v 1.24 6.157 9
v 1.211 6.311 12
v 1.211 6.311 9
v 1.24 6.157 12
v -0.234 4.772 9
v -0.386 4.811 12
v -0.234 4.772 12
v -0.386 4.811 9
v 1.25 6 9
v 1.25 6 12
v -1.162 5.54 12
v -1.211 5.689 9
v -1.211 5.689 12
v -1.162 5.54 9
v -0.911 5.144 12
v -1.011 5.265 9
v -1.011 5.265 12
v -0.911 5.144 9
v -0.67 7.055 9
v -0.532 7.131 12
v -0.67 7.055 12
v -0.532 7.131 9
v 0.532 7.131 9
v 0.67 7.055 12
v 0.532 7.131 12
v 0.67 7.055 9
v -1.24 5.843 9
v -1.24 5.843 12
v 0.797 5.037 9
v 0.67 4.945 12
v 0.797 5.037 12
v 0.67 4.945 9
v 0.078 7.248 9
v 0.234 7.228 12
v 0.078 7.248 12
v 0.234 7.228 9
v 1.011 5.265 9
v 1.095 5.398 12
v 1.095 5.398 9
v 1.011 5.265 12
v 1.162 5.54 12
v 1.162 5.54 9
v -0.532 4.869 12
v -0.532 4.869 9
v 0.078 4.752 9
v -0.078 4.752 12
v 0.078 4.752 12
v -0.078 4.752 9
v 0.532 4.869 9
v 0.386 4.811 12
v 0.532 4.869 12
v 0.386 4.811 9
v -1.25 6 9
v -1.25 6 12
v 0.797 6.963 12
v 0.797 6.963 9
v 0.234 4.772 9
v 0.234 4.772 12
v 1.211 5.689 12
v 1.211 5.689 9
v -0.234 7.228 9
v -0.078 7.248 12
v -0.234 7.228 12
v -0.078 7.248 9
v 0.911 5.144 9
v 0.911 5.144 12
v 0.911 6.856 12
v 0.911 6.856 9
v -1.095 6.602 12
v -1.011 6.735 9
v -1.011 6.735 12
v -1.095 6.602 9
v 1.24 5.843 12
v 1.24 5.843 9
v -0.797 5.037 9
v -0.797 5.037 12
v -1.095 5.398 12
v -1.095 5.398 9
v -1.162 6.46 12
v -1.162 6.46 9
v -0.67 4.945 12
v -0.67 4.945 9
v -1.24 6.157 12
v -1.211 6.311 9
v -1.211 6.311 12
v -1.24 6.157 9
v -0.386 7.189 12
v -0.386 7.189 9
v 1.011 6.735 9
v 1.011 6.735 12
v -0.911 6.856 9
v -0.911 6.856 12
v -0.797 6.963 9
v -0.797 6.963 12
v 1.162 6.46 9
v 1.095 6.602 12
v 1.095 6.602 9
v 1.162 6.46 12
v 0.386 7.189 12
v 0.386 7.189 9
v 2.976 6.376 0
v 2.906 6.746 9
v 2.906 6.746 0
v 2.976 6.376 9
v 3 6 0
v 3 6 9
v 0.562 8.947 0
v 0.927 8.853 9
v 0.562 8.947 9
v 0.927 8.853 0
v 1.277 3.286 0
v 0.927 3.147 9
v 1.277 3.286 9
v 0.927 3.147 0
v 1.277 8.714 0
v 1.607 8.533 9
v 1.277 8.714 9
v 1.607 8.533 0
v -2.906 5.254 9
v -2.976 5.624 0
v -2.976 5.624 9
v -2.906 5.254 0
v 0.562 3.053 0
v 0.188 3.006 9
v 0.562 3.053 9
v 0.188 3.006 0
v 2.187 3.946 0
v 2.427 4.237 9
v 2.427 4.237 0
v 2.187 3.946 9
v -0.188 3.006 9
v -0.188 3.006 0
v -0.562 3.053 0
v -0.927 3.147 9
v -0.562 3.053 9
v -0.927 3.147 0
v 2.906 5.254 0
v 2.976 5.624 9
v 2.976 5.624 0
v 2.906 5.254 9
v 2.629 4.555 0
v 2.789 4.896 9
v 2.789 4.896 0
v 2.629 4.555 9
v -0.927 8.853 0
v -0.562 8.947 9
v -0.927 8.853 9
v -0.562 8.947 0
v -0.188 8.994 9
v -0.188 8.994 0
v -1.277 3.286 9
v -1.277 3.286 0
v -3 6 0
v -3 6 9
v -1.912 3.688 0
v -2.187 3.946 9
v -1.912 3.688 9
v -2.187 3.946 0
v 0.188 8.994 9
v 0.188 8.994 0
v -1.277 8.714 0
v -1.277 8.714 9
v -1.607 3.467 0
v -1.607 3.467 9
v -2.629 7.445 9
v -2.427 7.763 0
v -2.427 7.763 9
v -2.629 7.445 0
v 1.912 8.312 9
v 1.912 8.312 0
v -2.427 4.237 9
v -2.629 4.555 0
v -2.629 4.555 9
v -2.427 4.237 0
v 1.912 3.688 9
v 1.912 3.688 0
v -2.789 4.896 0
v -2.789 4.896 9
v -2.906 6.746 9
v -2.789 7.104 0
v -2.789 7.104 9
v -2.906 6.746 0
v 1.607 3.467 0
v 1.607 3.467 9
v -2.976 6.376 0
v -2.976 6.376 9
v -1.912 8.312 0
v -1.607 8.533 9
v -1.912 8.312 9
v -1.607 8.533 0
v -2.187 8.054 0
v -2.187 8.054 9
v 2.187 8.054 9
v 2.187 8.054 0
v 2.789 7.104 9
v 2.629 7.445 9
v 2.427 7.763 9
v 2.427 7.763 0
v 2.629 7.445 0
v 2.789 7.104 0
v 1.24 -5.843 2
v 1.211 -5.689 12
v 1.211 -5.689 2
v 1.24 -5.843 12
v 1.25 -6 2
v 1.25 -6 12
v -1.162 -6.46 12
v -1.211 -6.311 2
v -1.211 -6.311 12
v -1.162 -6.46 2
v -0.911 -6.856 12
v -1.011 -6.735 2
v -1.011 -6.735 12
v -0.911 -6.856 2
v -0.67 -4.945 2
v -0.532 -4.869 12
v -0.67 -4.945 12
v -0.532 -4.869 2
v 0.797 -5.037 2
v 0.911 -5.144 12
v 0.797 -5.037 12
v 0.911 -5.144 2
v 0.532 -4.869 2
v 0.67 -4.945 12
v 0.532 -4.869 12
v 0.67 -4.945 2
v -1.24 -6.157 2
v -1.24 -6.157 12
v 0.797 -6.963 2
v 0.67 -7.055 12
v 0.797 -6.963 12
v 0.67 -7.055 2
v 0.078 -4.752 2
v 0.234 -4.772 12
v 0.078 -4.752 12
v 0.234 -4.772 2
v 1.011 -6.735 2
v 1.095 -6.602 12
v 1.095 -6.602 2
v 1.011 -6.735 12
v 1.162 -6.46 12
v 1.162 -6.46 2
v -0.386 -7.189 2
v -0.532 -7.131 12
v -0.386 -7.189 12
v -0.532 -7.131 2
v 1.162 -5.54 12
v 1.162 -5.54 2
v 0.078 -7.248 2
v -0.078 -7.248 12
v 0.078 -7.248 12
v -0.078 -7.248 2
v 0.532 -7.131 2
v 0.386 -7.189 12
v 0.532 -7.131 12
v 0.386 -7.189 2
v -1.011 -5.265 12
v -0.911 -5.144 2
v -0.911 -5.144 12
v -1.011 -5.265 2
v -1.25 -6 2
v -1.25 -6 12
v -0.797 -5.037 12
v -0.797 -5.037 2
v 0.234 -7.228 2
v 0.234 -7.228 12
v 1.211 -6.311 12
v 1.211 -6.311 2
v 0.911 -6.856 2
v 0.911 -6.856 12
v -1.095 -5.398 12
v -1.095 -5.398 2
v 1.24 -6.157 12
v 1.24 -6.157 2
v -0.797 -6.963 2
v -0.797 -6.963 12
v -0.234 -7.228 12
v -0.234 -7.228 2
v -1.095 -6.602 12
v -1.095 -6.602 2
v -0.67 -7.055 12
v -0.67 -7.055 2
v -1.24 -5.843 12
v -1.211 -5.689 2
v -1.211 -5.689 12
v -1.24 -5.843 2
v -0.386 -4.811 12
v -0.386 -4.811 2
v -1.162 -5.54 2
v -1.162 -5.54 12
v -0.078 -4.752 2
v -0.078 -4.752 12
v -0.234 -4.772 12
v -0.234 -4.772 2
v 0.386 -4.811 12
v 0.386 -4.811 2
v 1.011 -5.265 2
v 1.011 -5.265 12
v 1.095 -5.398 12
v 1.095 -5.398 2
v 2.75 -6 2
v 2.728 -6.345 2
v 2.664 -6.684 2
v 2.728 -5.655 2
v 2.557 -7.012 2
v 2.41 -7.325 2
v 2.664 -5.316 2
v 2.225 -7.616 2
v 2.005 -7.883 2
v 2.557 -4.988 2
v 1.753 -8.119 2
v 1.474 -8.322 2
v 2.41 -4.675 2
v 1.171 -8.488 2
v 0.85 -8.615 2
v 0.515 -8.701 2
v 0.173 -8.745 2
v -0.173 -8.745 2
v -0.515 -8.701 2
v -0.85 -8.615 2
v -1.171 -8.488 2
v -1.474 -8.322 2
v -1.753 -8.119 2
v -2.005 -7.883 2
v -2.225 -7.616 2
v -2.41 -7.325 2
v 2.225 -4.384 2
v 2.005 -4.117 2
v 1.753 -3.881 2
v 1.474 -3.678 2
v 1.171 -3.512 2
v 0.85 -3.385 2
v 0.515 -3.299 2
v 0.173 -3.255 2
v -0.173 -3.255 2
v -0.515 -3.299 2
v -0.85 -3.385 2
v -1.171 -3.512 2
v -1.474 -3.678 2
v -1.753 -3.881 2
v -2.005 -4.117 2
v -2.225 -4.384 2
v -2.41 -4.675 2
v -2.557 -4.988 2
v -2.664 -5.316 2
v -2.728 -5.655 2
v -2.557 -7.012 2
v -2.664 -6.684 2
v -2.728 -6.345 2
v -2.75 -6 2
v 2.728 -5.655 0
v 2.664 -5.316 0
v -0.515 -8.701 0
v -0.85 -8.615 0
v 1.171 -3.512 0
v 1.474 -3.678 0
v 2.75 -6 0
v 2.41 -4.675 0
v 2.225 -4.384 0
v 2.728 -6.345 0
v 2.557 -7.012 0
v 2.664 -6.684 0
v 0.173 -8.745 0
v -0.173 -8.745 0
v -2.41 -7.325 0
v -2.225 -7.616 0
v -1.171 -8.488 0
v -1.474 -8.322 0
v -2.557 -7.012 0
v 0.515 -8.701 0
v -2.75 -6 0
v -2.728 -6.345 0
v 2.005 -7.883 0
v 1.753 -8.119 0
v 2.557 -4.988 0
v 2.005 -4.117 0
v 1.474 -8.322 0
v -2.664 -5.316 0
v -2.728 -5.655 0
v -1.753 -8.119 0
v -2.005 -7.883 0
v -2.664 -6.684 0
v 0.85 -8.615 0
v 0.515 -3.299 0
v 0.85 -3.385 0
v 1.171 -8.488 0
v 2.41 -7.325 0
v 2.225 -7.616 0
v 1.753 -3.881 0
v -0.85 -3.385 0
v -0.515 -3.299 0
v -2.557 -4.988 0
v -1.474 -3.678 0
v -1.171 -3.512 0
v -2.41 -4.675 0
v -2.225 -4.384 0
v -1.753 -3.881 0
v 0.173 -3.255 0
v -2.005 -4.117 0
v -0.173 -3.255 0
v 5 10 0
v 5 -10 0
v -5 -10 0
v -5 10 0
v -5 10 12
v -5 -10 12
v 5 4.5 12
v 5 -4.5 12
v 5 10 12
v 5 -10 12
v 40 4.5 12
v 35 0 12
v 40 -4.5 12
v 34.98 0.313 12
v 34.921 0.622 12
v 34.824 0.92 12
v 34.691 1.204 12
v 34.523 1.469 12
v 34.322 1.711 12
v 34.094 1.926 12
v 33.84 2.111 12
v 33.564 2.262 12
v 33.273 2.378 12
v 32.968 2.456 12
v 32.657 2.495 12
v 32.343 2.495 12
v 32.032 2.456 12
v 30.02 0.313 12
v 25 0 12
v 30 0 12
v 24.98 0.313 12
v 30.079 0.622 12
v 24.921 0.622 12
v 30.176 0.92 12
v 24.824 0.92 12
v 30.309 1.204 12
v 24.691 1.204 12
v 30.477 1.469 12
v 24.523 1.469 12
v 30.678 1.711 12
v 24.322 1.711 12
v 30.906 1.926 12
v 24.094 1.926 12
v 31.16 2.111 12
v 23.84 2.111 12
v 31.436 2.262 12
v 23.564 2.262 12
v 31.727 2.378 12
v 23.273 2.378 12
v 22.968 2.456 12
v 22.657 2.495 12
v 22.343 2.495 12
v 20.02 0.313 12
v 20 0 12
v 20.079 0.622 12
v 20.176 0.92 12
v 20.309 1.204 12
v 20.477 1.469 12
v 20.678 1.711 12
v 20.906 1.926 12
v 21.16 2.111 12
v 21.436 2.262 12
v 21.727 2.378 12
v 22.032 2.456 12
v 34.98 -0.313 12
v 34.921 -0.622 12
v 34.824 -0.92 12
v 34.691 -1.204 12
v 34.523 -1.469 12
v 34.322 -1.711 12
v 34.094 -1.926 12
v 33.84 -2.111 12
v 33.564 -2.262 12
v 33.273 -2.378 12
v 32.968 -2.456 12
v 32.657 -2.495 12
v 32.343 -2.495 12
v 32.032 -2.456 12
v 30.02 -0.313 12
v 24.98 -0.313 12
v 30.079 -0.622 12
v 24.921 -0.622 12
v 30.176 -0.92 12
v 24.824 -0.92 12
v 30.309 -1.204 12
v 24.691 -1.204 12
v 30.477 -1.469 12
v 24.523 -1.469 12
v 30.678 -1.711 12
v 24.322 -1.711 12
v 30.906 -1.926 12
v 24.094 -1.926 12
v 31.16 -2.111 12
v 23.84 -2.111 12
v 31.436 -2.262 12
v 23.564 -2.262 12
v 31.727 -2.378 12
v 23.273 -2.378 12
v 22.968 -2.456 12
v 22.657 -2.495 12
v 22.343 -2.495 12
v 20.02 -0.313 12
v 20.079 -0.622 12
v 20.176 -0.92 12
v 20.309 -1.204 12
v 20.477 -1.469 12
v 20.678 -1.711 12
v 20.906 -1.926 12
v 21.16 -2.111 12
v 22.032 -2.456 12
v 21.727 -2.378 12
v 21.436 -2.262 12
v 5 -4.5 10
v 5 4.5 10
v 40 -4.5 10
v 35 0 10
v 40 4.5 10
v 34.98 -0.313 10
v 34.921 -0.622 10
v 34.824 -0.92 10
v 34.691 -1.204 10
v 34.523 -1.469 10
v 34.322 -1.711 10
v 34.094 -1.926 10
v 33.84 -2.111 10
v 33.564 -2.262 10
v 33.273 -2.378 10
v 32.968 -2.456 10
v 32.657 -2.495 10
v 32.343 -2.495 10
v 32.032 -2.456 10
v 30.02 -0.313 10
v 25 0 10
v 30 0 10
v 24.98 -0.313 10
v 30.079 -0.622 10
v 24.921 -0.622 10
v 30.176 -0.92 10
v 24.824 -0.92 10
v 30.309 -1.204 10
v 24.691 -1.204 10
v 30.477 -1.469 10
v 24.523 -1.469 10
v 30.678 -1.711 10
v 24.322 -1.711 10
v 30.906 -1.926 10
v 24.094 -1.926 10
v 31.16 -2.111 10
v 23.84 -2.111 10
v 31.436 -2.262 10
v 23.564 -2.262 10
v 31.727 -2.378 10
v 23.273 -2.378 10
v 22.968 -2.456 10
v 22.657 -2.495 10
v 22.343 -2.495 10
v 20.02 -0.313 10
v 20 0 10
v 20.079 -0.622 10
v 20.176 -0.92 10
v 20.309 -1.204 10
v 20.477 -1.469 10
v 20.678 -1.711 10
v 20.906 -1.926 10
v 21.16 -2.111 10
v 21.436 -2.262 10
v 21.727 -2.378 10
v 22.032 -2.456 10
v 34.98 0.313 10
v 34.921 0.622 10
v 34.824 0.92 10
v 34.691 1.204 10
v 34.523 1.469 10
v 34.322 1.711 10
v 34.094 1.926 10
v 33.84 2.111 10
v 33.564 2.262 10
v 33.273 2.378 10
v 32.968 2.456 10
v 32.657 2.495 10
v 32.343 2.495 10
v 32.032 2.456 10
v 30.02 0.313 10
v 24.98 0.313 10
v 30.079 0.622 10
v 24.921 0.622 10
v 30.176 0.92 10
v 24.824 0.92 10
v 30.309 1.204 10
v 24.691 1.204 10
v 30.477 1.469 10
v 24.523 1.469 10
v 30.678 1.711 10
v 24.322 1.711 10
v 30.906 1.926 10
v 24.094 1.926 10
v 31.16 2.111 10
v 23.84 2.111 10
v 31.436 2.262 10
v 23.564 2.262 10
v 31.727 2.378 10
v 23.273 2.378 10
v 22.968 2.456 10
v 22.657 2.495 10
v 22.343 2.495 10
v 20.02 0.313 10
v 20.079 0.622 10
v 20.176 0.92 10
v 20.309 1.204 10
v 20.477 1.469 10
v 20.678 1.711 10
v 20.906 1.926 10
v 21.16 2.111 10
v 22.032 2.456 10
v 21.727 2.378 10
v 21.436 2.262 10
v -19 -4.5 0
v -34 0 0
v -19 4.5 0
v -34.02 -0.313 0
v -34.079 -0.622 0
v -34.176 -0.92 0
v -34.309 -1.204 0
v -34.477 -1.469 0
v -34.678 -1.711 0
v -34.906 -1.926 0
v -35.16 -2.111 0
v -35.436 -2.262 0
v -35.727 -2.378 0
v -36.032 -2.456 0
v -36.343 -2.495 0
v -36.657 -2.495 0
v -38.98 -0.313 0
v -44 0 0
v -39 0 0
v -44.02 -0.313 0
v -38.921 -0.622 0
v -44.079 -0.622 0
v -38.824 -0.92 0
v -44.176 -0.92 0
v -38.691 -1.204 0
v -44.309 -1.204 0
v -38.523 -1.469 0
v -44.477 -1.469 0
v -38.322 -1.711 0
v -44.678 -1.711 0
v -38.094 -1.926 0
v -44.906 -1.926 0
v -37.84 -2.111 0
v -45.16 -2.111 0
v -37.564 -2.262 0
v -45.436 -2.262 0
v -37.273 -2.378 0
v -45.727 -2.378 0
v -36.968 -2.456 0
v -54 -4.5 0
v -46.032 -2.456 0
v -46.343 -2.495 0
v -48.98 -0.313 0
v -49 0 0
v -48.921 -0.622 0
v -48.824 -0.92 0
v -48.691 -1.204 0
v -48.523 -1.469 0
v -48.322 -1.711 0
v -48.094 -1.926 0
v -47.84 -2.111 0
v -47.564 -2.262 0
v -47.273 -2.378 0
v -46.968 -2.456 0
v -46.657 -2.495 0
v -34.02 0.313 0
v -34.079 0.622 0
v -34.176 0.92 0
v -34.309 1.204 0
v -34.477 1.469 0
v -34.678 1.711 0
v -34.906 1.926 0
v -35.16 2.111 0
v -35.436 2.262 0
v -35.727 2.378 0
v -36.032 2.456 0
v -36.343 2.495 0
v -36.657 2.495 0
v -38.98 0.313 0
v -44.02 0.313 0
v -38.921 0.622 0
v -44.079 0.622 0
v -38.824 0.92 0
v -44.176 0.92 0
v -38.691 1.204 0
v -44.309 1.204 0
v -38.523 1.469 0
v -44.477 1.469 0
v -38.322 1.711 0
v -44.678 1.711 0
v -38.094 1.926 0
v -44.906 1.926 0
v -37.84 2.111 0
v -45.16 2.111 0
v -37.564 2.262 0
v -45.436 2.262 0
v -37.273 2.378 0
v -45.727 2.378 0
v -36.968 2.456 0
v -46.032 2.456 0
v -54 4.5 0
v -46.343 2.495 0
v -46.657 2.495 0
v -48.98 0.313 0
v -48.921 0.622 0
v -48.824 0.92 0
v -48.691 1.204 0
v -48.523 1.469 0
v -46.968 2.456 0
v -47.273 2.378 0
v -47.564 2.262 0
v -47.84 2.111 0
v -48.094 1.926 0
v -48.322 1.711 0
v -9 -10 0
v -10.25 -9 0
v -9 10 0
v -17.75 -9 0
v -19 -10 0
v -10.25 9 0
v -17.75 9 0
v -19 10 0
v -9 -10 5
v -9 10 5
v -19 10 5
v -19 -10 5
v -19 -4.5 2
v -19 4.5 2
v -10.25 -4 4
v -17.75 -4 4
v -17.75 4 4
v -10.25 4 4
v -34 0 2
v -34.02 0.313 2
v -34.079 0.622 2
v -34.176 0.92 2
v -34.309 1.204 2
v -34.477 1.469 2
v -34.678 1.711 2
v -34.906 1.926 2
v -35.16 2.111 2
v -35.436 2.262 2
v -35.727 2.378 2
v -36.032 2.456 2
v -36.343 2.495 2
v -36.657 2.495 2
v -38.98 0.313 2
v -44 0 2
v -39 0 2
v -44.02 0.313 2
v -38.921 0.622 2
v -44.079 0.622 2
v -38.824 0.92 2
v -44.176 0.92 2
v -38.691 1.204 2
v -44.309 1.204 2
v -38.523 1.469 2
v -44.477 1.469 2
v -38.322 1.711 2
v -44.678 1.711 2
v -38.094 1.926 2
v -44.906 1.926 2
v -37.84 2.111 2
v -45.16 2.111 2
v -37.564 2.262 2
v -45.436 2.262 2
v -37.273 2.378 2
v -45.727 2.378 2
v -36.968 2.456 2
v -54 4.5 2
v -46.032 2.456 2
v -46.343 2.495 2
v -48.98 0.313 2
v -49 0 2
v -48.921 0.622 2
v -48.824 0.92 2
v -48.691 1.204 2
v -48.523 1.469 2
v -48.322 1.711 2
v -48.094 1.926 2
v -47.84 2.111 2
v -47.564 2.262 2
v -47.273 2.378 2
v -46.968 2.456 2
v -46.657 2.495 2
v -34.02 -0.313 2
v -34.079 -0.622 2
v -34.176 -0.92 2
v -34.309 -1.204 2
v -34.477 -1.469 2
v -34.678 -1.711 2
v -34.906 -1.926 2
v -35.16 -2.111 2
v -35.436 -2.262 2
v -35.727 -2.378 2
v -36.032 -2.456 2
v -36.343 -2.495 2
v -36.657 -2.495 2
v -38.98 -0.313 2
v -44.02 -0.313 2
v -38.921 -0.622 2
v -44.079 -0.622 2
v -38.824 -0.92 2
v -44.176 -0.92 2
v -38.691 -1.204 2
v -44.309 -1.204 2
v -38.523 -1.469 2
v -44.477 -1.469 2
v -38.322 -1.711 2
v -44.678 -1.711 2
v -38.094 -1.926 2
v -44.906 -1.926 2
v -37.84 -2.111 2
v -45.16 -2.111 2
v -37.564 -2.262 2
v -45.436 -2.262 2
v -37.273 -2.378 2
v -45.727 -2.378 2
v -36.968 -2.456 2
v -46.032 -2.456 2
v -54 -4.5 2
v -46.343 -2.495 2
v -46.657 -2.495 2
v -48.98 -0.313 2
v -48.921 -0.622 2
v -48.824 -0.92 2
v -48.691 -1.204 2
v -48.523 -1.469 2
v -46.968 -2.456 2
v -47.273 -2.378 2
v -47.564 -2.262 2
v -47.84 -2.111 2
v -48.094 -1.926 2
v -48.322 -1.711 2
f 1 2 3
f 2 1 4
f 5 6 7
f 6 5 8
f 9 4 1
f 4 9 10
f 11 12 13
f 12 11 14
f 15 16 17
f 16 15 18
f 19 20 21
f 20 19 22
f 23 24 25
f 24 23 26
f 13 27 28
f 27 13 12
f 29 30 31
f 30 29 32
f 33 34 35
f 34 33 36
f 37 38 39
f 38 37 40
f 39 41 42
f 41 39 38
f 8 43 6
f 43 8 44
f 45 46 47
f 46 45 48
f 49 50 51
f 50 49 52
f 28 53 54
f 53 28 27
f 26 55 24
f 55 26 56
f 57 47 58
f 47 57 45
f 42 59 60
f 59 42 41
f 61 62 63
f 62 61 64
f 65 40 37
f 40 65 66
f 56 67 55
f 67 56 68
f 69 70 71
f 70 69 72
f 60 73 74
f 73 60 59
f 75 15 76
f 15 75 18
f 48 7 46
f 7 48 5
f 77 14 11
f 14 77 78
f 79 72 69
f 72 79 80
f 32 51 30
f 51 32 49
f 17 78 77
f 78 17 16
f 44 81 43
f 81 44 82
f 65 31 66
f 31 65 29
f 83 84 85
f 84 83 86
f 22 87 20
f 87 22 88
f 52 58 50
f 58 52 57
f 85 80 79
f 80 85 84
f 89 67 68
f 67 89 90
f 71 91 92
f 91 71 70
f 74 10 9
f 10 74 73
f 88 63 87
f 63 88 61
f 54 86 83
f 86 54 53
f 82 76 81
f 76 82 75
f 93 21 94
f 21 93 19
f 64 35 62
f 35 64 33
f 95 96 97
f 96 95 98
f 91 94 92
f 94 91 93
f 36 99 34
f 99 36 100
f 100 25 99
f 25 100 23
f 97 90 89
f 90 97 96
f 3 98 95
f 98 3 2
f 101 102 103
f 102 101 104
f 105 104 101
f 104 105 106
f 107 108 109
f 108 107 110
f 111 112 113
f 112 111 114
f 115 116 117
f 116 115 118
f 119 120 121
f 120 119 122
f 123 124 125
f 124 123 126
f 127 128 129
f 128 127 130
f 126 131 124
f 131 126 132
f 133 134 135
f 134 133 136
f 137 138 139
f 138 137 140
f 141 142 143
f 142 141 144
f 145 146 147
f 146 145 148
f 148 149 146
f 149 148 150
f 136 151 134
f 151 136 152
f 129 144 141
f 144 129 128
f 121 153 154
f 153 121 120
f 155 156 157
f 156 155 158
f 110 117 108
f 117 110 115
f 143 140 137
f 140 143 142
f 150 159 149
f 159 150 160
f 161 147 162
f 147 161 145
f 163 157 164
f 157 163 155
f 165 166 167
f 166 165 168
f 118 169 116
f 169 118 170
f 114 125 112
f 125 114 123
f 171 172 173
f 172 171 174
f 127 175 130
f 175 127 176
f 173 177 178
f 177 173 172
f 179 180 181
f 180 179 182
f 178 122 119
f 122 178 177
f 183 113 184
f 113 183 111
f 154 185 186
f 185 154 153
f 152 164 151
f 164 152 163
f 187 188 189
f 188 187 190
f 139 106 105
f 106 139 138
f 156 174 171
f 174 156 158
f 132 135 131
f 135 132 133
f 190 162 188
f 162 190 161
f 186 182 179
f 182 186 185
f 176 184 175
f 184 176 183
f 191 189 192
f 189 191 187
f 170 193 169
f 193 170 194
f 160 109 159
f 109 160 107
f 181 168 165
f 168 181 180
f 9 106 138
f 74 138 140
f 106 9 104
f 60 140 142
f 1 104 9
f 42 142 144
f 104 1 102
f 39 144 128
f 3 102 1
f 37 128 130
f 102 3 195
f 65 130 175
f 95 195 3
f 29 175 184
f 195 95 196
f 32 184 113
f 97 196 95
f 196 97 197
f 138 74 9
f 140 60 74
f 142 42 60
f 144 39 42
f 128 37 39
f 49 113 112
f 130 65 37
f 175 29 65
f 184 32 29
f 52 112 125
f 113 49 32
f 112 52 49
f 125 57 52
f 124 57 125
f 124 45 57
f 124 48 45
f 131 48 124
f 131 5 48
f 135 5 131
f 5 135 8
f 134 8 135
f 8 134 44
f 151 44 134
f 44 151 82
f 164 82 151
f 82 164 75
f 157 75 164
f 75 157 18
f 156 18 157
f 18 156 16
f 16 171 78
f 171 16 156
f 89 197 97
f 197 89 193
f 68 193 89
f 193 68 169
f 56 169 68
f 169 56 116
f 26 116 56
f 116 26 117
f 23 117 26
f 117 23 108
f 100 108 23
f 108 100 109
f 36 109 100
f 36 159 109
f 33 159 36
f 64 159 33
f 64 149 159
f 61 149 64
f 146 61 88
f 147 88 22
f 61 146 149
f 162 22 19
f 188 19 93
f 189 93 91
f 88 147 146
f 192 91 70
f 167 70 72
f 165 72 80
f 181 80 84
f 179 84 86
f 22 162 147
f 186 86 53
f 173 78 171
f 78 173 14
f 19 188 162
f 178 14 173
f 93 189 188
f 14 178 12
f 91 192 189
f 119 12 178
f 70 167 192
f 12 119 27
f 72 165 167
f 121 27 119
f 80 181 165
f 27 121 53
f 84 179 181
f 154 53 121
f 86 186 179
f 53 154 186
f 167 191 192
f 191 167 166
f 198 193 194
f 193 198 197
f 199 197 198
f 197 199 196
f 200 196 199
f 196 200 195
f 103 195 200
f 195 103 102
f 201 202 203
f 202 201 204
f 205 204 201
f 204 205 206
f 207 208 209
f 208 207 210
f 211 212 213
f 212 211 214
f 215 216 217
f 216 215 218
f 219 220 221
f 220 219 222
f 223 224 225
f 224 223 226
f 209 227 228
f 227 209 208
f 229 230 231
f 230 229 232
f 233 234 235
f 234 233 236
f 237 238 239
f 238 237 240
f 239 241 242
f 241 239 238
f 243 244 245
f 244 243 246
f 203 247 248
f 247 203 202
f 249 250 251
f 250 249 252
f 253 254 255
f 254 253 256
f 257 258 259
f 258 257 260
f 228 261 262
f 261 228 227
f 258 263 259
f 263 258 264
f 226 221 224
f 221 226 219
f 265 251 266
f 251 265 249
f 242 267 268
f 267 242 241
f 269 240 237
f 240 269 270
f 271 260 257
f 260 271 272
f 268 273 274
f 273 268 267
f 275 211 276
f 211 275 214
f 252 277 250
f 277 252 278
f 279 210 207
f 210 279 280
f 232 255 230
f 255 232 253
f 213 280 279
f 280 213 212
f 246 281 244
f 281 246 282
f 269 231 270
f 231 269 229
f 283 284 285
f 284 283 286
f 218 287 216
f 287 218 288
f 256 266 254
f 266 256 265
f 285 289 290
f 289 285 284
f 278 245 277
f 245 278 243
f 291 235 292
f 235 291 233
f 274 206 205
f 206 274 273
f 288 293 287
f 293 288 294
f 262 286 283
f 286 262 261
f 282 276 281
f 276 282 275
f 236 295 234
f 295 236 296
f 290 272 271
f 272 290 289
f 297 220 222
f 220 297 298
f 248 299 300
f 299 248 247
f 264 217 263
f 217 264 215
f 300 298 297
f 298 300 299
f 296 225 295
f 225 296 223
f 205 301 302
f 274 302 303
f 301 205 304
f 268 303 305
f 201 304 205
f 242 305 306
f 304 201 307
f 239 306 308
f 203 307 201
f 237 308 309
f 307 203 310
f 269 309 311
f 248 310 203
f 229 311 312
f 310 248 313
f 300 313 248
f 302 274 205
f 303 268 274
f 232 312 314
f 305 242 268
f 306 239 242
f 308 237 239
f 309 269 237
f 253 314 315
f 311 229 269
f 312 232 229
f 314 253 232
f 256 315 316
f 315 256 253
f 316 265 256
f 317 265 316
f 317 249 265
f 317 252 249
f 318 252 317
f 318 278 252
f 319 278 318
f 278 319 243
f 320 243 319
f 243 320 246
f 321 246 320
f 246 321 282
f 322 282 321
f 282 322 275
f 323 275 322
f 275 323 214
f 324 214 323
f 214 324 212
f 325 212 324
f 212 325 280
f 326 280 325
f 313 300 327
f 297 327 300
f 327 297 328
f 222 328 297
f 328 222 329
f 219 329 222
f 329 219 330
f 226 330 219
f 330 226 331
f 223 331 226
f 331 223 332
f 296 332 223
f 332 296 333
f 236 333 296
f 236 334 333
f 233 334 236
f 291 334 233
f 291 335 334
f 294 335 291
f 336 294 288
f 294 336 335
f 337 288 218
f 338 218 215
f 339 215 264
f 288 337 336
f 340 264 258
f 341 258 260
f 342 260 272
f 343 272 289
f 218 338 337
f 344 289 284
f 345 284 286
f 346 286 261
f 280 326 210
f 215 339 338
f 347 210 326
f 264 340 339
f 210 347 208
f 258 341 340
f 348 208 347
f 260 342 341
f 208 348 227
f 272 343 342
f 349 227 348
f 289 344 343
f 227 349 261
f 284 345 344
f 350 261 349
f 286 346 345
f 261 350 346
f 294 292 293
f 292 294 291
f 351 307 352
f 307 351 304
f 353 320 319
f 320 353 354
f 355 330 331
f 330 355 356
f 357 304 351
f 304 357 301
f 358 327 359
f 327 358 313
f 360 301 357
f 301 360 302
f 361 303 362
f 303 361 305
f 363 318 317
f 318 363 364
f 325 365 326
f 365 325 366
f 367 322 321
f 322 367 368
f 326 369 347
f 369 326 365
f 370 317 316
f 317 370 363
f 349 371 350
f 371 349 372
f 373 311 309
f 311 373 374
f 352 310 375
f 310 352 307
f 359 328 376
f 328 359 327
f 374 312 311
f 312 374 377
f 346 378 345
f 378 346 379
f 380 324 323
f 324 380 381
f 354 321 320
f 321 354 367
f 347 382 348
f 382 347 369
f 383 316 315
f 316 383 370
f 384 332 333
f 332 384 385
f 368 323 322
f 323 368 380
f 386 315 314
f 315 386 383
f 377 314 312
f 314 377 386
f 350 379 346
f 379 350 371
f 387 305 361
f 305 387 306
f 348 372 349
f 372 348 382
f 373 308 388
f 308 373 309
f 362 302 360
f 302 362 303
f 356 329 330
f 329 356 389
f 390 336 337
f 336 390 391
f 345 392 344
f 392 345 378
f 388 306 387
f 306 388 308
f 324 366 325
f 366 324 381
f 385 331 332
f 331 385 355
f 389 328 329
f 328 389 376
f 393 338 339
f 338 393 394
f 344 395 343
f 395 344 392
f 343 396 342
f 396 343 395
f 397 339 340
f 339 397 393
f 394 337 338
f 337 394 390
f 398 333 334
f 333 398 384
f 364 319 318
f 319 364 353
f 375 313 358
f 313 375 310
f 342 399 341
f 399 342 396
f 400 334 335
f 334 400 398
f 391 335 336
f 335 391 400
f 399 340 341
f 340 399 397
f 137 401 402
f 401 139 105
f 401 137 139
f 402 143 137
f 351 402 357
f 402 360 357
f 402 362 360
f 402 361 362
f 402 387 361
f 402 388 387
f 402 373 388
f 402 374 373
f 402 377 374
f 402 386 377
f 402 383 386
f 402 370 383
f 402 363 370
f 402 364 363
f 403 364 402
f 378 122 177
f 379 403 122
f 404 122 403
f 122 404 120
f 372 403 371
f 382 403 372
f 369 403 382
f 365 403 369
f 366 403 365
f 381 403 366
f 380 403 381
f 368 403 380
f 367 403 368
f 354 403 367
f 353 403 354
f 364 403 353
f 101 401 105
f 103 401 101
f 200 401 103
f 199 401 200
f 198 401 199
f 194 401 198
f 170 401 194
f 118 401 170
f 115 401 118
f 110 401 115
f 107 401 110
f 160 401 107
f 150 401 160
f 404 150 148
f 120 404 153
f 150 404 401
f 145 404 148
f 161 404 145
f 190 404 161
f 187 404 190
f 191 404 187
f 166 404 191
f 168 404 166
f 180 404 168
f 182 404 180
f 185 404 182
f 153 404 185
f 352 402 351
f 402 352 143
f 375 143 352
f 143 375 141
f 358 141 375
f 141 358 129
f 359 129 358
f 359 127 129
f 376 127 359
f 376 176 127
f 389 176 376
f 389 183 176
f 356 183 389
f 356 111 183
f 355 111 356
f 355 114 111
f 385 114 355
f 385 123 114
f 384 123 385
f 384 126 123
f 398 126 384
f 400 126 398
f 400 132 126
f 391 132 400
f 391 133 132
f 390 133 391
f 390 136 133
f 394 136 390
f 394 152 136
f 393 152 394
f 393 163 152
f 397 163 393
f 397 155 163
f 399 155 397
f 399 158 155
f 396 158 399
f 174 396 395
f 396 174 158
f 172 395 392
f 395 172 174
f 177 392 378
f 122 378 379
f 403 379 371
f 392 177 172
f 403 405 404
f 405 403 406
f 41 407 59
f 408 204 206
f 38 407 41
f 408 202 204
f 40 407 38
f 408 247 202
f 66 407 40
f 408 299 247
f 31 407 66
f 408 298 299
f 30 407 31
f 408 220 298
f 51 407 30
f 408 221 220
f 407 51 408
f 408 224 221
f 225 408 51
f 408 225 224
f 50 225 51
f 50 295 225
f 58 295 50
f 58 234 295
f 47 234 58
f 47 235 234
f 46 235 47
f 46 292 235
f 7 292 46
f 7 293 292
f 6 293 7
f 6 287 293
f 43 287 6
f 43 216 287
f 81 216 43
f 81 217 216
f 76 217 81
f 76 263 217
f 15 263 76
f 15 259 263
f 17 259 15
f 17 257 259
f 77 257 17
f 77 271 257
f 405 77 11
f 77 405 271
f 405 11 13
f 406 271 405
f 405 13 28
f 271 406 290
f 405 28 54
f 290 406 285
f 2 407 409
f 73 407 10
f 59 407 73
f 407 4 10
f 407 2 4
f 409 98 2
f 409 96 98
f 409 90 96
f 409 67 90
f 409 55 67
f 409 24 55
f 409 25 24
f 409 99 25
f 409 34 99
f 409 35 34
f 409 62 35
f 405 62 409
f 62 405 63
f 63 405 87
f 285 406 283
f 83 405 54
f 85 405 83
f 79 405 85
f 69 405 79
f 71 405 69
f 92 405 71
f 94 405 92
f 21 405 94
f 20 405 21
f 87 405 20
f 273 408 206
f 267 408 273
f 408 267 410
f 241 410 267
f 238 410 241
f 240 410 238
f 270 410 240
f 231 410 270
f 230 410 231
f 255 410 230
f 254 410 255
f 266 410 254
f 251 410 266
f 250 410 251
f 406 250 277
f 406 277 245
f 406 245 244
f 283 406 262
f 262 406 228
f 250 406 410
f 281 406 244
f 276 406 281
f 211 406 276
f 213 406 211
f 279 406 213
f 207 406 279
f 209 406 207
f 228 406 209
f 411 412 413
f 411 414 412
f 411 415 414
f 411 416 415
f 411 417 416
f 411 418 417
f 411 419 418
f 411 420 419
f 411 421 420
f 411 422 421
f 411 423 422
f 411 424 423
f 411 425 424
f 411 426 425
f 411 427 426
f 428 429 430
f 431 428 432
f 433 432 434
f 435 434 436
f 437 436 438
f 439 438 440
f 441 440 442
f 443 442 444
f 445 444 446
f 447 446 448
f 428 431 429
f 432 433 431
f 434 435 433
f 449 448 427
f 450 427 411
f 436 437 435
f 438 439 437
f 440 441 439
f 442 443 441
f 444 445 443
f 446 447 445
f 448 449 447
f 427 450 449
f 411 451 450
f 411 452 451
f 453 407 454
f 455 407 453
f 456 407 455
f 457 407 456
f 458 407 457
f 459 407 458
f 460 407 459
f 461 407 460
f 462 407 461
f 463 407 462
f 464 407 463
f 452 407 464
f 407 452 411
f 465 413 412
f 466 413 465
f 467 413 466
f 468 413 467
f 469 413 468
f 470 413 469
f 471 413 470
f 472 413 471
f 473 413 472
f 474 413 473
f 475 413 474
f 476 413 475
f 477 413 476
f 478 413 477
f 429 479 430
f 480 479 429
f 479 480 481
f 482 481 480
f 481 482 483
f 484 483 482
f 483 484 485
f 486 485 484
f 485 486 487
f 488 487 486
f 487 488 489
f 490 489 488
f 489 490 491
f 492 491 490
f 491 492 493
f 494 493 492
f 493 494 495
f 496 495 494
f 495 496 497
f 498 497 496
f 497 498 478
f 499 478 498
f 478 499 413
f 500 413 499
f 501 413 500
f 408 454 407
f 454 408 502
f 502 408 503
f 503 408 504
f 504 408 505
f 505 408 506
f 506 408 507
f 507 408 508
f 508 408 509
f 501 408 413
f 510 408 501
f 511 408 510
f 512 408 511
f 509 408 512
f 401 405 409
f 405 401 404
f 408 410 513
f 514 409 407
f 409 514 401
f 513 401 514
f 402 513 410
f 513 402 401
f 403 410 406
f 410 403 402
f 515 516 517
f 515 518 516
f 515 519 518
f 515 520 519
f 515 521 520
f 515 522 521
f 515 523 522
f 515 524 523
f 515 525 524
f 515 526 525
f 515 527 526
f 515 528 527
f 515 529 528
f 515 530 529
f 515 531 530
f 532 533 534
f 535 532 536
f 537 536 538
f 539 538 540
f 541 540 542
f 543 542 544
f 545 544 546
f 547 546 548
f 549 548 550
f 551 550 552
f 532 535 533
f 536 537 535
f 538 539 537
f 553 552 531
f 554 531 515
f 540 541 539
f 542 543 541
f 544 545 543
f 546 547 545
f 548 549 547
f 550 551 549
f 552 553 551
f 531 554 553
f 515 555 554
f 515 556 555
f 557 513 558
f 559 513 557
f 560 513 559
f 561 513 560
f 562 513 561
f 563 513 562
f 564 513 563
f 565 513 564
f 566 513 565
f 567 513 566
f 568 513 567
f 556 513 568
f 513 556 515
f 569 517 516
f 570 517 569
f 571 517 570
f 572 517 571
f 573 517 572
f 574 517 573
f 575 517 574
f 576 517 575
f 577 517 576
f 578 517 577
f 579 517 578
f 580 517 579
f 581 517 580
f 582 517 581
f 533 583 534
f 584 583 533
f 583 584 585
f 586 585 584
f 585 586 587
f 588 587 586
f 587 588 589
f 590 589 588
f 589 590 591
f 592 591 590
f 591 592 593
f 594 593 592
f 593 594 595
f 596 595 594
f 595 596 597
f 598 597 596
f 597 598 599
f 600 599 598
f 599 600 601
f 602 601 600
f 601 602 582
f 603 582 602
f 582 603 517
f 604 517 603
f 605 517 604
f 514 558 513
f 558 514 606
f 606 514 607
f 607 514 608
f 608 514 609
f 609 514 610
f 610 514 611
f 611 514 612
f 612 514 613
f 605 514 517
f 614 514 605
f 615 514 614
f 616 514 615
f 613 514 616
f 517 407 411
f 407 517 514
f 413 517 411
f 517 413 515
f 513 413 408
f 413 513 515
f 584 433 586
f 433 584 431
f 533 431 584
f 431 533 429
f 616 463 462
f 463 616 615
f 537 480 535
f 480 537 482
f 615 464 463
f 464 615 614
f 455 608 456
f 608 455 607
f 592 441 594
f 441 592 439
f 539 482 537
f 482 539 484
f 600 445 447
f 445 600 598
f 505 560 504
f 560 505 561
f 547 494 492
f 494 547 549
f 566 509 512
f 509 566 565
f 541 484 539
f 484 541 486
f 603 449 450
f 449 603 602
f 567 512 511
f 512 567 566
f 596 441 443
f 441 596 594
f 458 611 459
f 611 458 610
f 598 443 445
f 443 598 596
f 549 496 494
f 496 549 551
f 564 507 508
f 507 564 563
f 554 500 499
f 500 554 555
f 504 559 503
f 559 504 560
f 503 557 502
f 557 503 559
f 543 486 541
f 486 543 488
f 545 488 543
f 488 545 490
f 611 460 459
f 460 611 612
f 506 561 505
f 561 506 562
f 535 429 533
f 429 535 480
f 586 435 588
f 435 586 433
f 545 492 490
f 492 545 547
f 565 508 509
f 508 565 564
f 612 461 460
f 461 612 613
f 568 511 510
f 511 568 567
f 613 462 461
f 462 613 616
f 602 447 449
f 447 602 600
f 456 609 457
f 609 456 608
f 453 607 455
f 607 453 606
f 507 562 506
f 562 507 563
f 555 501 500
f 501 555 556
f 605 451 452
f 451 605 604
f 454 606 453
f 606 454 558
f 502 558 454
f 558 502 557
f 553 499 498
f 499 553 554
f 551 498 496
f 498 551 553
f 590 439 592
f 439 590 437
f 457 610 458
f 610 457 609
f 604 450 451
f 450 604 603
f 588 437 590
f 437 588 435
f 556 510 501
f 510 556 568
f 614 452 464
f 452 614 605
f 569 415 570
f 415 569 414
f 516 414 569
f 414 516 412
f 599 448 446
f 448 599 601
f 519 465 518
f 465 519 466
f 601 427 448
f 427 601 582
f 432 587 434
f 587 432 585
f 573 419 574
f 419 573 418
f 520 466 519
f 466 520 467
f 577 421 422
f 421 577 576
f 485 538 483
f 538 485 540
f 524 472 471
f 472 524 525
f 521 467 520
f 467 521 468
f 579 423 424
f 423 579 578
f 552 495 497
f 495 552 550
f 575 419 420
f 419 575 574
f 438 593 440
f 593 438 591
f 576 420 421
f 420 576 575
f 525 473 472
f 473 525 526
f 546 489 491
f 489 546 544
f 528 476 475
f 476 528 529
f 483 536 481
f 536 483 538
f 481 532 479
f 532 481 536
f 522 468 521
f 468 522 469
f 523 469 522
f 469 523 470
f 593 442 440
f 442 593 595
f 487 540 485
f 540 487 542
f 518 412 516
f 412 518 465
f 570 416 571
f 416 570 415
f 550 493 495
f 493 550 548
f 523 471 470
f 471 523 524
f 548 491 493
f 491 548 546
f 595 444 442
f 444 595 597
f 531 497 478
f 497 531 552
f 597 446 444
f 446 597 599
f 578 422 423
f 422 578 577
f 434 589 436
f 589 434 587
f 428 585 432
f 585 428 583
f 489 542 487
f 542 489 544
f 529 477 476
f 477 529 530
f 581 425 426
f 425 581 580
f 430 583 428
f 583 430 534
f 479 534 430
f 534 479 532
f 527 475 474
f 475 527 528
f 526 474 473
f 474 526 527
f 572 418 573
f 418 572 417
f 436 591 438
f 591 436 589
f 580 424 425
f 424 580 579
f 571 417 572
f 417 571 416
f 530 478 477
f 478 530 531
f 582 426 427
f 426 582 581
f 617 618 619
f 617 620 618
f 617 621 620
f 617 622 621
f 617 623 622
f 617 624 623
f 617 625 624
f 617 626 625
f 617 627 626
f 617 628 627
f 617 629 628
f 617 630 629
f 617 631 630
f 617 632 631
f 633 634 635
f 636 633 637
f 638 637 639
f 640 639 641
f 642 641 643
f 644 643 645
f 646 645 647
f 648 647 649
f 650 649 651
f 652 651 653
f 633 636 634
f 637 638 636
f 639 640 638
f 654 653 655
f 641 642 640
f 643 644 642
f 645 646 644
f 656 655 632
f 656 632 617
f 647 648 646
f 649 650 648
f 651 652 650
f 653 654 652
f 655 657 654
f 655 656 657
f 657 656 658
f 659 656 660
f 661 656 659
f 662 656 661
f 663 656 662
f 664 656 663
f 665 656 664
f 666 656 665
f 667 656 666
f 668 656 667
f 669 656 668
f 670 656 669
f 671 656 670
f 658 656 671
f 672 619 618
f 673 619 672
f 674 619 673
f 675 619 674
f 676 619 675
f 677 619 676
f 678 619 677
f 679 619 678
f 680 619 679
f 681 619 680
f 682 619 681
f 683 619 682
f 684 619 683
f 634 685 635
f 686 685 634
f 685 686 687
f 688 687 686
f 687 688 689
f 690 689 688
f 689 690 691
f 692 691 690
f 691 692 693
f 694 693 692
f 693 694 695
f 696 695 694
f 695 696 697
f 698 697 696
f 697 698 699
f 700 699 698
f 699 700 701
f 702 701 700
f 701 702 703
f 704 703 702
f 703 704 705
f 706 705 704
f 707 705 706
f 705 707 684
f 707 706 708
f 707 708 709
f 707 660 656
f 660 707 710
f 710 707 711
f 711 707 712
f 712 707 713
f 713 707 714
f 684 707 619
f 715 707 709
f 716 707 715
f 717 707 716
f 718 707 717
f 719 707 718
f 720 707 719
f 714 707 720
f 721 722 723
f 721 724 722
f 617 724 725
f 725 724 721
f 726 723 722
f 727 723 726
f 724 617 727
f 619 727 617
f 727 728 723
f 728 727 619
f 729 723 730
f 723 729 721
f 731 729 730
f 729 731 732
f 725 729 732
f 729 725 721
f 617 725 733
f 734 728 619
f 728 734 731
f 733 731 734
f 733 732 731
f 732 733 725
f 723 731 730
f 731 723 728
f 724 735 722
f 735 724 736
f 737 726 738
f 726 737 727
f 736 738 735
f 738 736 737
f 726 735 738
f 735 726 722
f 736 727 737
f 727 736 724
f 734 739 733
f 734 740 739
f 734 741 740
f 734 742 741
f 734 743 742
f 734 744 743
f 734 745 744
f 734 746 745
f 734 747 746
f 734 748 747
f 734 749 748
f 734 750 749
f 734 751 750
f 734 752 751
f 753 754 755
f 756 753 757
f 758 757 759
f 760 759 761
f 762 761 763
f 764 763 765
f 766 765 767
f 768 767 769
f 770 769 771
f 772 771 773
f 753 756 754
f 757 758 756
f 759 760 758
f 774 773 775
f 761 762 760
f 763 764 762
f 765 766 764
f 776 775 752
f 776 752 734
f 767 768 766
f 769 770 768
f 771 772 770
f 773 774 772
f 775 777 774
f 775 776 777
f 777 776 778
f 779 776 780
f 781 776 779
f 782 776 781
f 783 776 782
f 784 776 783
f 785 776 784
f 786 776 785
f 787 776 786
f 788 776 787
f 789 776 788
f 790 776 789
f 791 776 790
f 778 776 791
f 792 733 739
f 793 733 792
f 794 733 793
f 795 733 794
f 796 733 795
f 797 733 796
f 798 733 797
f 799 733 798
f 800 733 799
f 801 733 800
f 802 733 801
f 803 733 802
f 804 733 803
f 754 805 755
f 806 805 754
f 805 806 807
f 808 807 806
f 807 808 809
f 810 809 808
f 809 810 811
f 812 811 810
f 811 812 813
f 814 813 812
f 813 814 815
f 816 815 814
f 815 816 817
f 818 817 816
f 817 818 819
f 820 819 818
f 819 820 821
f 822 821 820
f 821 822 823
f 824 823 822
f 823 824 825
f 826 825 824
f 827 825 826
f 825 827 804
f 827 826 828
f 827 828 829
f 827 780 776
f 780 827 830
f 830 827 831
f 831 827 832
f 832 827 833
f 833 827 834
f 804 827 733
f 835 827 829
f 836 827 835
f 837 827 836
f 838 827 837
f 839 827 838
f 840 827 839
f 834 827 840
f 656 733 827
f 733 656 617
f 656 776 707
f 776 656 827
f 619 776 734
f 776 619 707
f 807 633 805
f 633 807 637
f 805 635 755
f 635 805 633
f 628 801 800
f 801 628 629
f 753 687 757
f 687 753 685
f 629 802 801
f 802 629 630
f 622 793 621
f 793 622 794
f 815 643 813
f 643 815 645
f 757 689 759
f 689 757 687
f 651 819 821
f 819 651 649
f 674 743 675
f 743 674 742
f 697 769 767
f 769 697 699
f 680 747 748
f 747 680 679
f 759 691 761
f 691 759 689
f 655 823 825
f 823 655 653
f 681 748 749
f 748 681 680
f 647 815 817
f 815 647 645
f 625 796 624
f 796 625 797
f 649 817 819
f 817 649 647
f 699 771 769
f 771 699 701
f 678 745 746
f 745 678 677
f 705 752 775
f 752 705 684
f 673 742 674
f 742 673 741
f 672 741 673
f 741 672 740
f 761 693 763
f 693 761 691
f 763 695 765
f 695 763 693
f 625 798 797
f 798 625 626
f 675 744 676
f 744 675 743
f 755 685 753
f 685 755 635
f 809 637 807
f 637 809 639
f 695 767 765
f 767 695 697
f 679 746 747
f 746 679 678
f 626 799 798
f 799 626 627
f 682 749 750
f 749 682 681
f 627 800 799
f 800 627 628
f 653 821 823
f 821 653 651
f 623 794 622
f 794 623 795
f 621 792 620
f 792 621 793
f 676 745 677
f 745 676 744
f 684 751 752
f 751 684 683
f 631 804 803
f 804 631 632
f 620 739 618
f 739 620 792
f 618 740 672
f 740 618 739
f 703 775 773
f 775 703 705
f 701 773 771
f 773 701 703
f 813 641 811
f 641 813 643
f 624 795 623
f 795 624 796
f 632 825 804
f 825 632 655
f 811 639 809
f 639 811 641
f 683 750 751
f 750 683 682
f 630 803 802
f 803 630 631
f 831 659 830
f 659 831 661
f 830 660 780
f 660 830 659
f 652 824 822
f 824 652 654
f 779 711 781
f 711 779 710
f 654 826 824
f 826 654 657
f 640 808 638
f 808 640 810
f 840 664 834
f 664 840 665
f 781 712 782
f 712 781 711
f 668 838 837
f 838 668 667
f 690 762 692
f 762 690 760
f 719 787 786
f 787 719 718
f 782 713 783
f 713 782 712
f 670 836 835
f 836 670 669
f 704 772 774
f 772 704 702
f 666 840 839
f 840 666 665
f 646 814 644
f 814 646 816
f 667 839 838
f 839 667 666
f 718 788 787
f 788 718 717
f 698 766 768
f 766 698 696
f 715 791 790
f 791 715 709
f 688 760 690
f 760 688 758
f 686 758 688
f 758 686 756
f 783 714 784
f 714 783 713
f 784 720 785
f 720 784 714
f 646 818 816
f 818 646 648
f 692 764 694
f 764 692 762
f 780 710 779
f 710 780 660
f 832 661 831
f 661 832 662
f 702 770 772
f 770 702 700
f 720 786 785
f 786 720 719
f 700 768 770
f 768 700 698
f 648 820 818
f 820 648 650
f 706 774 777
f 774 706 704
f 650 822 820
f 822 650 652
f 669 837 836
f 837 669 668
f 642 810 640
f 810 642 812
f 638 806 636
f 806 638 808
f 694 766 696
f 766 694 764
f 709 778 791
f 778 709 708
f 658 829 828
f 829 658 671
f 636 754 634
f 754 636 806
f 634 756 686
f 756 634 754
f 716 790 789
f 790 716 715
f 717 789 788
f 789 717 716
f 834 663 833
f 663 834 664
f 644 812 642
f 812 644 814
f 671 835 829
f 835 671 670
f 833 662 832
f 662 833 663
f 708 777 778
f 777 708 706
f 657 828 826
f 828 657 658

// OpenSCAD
/* [Laser Diode] */
laser_light_hole_diameter = 2.5; //[0:5]

laser_diameter = 6; //[1:20]

laser_length = 9; // [5:25]

/* [General] */
module_height = 20; 

resolution = 50; //[10:100]

/* [Receiver Diode] */
receiver_diameter = 5.5; //[1:20]

reciever_depth_in_module = 3; //[1:10]

/* [Mirrors] */
module_thickness = 5; //[5:20]

/* [Mounting] */
activate_mounting = true; //[true,false]

mounting_distance = 20; //[5:30]

mounting_screw_diameter = 5; //[2:35]

mounting_thickness = 2; //[2:20]

laser_module_on_top = true; //[false,true]

mirror_module_on_top = false; //[false,true]

/*[Creation Selection] */
create = 0; //[0:both, 1:laser, 2:mirror]

/* [Hidden]*/
distance_length = mounting_distance + mounting_screw_diameter * 3;

module mounting(x,y,z) {
translate([x,y,z])
    difference() {
                translate([(distance_length)/2 + (laser_diameter+4)/2,0,0])
                    linear_extrude(mounting_thickness)
                        square([distance_length, mounting_screw_diameter + 4], true);
                translate([mounting_distance + mounting_screw_diameter/2,0,-1])
                    linear_extrude(mounting_thickness*2)
                        circle(d=mounting_screw_diameter, true, $fn=resolution);
                translate([mounting_distance + mounting_screw_diameter*2.5,0,-1])
                    linear_extrude(mounting_thickness*2)
                        circle(d=mounting_screw_diameter, true, $fn=resolution);
            }
}

module laser_module() {
    union(){
        difference() {
            linear_extrude(laser_length + 3)
                square([laser_diameter + 4,module_height,],true);
            
            translate([0,module_height/2 -4,0]) {
                translate([0,0,laser_length - 1])
                    linear_extrude(laser_length)
                        circle(d=laser_light_hole_diameter, $fn=resolution);
                translate([0,0,-1])
                    linear_extrude(laser_length + 1)
                        circle(d=laser_diameter, $fn=resolution);
            }
            
            translate([0,-module_height/2 + 4,0]) {
                translate([0,0,reciever_depth_in_module - 1])
                    linear_extrude(laser_length +4)
                        circle(d=laser_light_hole_diameter, $fn=resolution);
                translate([0,0,-1])
                    linear_extrude(reciever_depth_in_module)
                        circle(d=receiver_diameter, $fn=resolution);
            }
        }
        if(activate_mounting) {
            if(laser_module_on_top) {
                mounting(0,0,laser_length+3-mounting_thickness);
            }else {
                mounting(0,0,0);
            }
                
        }
    }
}
module mirror_module() {
    translate([-laser_diameter -8,0,0])
    rotate([0,0,180])
    union(){
            difference() {
                linear_extrude(module_thickness)
                    square([laser_diameter + 4,module_height,],true);
                
                translate([(laser_diameter + 4)*0.75*0.5,0,0])
                    rotate([0,-90,0])
                        linear_extrude((laser_diameter + 4)*0.75)
                            polygon([[-1,-module_height/2 + 1],[0,-module_height/2 + 1],[module_thickness-1,-tan(45)*(module_thickness-1)],[module_thickness-1,tan(45)*(module_thickness-1)],[0,module_height/2 - 1],[-1,module_height/2 - 1],]);
            }
            if(activate_mounting) {
                if(mirror_module_on_top){
                    mounting(0,0,module_thickness - mounting_thickness);
                }else{
                    mounting(0,0,0);
                }
            }
    }
}

if(create == 1) {
    laser_module();
}else if(create == 2) {
    mirror_module();
}else{
    laser_module();
    mirror_module();
}
